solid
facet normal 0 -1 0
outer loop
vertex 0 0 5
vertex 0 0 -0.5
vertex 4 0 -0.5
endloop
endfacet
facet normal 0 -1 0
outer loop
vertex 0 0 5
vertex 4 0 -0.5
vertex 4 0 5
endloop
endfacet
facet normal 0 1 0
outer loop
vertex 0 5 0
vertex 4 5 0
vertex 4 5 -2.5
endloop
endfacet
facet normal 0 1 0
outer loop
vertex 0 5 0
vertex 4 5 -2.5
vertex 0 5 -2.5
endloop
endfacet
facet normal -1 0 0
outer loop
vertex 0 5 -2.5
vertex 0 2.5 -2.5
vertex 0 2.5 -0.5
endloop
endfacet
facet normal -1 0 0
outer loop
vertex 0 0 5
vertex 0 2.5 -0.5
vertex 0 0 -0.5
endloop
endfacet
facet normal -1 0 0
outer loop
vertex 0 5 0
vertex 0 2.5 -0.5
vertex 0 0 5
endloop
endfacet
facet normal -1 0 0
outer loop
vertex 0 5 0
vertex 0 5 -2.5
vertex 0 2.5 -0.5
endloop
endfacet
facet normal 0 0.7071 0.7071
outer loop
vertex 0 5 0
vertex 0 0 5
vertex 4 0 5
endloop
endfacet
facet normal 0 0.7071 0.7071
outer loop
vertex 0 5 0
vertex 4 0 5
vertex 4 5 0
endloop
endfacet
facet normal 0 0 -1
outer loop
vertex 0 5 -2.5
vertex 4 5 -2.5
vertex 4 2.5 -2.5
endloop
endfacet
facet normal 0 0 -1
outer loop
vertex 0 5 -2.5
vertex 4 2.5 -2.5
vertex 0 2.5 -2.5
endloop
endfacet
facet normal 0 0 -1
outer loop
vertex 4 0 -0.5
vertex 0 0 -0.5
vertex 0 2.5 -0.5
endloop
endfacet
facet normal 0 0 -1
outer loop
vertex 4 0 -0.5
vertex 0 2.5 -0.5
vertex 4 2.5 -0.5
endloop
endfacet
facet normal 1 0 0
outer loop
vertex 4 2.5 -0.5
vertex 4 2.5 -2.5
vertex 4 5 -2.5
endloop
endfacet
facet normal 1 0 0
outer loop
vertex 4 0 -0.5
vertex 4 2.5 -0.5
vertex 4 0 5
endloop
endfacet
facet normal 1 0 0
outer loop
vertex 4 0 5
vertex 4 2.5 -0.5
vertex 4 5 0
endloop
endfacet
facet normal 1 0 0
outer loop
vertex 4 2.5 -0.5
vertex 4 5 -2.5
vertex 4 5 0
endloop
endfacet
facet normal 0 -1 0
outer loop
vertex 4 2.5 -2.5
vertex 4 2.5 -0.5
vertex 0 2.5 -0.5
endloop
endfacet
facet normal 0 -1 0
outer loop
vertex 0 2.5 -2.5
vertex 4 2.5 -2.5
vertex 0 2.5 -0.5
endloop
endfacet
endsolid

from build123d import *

# Parameters (mm, degrees)
SKETCH1_W           = 4
SKETCH1_H           = 0.5
BOSS_EXTRUDE1_DEPTH = 5
SKETCH2_W           = 4
SKETCH2_H           = 2.5
BOSS_EXTRUDE2_DEPTH = 2
BOSS_EXTRUDE4_DEPTH = 4


with BuildPart() as part:
    # Sketch1 → Boss-Extrude1 (new body)
    with BuildSketch(Plane(origin=(0, 0, 0), x_dir=(1, 0, 0), z_dir=(0, 1, 0))):
        with Locations((2, 0.25)):
            Rectangle(SKETCH1_W, SKETCH1_H)
    extrude(amount=BOSS_EXTRUDE1_DEPTH)

    # Sketch2 → Boss-Extrude2 (add)
    with BuildSketch(Plane(origin=(0, 0, -0.5), x_dir=(-1, 0, 0), z_dir=(0, 0, -1))):
        with Locations((-2, 3.75)):
            Rectangle(SKETCH2_W, SKETCH2_H)
    extrude(amount=BOSS_EXTRUDE2_DEPTH)

    # Sketch4 → Boss-Extrude4 (add)
    with BuildSketch(Plane.ZY):
        Polygon((0, 5), (0, 0), (5, 0), align=None)
    extrude(amount=-BOSS_EXTRUDE4_DEPTH)


solid = part.part
